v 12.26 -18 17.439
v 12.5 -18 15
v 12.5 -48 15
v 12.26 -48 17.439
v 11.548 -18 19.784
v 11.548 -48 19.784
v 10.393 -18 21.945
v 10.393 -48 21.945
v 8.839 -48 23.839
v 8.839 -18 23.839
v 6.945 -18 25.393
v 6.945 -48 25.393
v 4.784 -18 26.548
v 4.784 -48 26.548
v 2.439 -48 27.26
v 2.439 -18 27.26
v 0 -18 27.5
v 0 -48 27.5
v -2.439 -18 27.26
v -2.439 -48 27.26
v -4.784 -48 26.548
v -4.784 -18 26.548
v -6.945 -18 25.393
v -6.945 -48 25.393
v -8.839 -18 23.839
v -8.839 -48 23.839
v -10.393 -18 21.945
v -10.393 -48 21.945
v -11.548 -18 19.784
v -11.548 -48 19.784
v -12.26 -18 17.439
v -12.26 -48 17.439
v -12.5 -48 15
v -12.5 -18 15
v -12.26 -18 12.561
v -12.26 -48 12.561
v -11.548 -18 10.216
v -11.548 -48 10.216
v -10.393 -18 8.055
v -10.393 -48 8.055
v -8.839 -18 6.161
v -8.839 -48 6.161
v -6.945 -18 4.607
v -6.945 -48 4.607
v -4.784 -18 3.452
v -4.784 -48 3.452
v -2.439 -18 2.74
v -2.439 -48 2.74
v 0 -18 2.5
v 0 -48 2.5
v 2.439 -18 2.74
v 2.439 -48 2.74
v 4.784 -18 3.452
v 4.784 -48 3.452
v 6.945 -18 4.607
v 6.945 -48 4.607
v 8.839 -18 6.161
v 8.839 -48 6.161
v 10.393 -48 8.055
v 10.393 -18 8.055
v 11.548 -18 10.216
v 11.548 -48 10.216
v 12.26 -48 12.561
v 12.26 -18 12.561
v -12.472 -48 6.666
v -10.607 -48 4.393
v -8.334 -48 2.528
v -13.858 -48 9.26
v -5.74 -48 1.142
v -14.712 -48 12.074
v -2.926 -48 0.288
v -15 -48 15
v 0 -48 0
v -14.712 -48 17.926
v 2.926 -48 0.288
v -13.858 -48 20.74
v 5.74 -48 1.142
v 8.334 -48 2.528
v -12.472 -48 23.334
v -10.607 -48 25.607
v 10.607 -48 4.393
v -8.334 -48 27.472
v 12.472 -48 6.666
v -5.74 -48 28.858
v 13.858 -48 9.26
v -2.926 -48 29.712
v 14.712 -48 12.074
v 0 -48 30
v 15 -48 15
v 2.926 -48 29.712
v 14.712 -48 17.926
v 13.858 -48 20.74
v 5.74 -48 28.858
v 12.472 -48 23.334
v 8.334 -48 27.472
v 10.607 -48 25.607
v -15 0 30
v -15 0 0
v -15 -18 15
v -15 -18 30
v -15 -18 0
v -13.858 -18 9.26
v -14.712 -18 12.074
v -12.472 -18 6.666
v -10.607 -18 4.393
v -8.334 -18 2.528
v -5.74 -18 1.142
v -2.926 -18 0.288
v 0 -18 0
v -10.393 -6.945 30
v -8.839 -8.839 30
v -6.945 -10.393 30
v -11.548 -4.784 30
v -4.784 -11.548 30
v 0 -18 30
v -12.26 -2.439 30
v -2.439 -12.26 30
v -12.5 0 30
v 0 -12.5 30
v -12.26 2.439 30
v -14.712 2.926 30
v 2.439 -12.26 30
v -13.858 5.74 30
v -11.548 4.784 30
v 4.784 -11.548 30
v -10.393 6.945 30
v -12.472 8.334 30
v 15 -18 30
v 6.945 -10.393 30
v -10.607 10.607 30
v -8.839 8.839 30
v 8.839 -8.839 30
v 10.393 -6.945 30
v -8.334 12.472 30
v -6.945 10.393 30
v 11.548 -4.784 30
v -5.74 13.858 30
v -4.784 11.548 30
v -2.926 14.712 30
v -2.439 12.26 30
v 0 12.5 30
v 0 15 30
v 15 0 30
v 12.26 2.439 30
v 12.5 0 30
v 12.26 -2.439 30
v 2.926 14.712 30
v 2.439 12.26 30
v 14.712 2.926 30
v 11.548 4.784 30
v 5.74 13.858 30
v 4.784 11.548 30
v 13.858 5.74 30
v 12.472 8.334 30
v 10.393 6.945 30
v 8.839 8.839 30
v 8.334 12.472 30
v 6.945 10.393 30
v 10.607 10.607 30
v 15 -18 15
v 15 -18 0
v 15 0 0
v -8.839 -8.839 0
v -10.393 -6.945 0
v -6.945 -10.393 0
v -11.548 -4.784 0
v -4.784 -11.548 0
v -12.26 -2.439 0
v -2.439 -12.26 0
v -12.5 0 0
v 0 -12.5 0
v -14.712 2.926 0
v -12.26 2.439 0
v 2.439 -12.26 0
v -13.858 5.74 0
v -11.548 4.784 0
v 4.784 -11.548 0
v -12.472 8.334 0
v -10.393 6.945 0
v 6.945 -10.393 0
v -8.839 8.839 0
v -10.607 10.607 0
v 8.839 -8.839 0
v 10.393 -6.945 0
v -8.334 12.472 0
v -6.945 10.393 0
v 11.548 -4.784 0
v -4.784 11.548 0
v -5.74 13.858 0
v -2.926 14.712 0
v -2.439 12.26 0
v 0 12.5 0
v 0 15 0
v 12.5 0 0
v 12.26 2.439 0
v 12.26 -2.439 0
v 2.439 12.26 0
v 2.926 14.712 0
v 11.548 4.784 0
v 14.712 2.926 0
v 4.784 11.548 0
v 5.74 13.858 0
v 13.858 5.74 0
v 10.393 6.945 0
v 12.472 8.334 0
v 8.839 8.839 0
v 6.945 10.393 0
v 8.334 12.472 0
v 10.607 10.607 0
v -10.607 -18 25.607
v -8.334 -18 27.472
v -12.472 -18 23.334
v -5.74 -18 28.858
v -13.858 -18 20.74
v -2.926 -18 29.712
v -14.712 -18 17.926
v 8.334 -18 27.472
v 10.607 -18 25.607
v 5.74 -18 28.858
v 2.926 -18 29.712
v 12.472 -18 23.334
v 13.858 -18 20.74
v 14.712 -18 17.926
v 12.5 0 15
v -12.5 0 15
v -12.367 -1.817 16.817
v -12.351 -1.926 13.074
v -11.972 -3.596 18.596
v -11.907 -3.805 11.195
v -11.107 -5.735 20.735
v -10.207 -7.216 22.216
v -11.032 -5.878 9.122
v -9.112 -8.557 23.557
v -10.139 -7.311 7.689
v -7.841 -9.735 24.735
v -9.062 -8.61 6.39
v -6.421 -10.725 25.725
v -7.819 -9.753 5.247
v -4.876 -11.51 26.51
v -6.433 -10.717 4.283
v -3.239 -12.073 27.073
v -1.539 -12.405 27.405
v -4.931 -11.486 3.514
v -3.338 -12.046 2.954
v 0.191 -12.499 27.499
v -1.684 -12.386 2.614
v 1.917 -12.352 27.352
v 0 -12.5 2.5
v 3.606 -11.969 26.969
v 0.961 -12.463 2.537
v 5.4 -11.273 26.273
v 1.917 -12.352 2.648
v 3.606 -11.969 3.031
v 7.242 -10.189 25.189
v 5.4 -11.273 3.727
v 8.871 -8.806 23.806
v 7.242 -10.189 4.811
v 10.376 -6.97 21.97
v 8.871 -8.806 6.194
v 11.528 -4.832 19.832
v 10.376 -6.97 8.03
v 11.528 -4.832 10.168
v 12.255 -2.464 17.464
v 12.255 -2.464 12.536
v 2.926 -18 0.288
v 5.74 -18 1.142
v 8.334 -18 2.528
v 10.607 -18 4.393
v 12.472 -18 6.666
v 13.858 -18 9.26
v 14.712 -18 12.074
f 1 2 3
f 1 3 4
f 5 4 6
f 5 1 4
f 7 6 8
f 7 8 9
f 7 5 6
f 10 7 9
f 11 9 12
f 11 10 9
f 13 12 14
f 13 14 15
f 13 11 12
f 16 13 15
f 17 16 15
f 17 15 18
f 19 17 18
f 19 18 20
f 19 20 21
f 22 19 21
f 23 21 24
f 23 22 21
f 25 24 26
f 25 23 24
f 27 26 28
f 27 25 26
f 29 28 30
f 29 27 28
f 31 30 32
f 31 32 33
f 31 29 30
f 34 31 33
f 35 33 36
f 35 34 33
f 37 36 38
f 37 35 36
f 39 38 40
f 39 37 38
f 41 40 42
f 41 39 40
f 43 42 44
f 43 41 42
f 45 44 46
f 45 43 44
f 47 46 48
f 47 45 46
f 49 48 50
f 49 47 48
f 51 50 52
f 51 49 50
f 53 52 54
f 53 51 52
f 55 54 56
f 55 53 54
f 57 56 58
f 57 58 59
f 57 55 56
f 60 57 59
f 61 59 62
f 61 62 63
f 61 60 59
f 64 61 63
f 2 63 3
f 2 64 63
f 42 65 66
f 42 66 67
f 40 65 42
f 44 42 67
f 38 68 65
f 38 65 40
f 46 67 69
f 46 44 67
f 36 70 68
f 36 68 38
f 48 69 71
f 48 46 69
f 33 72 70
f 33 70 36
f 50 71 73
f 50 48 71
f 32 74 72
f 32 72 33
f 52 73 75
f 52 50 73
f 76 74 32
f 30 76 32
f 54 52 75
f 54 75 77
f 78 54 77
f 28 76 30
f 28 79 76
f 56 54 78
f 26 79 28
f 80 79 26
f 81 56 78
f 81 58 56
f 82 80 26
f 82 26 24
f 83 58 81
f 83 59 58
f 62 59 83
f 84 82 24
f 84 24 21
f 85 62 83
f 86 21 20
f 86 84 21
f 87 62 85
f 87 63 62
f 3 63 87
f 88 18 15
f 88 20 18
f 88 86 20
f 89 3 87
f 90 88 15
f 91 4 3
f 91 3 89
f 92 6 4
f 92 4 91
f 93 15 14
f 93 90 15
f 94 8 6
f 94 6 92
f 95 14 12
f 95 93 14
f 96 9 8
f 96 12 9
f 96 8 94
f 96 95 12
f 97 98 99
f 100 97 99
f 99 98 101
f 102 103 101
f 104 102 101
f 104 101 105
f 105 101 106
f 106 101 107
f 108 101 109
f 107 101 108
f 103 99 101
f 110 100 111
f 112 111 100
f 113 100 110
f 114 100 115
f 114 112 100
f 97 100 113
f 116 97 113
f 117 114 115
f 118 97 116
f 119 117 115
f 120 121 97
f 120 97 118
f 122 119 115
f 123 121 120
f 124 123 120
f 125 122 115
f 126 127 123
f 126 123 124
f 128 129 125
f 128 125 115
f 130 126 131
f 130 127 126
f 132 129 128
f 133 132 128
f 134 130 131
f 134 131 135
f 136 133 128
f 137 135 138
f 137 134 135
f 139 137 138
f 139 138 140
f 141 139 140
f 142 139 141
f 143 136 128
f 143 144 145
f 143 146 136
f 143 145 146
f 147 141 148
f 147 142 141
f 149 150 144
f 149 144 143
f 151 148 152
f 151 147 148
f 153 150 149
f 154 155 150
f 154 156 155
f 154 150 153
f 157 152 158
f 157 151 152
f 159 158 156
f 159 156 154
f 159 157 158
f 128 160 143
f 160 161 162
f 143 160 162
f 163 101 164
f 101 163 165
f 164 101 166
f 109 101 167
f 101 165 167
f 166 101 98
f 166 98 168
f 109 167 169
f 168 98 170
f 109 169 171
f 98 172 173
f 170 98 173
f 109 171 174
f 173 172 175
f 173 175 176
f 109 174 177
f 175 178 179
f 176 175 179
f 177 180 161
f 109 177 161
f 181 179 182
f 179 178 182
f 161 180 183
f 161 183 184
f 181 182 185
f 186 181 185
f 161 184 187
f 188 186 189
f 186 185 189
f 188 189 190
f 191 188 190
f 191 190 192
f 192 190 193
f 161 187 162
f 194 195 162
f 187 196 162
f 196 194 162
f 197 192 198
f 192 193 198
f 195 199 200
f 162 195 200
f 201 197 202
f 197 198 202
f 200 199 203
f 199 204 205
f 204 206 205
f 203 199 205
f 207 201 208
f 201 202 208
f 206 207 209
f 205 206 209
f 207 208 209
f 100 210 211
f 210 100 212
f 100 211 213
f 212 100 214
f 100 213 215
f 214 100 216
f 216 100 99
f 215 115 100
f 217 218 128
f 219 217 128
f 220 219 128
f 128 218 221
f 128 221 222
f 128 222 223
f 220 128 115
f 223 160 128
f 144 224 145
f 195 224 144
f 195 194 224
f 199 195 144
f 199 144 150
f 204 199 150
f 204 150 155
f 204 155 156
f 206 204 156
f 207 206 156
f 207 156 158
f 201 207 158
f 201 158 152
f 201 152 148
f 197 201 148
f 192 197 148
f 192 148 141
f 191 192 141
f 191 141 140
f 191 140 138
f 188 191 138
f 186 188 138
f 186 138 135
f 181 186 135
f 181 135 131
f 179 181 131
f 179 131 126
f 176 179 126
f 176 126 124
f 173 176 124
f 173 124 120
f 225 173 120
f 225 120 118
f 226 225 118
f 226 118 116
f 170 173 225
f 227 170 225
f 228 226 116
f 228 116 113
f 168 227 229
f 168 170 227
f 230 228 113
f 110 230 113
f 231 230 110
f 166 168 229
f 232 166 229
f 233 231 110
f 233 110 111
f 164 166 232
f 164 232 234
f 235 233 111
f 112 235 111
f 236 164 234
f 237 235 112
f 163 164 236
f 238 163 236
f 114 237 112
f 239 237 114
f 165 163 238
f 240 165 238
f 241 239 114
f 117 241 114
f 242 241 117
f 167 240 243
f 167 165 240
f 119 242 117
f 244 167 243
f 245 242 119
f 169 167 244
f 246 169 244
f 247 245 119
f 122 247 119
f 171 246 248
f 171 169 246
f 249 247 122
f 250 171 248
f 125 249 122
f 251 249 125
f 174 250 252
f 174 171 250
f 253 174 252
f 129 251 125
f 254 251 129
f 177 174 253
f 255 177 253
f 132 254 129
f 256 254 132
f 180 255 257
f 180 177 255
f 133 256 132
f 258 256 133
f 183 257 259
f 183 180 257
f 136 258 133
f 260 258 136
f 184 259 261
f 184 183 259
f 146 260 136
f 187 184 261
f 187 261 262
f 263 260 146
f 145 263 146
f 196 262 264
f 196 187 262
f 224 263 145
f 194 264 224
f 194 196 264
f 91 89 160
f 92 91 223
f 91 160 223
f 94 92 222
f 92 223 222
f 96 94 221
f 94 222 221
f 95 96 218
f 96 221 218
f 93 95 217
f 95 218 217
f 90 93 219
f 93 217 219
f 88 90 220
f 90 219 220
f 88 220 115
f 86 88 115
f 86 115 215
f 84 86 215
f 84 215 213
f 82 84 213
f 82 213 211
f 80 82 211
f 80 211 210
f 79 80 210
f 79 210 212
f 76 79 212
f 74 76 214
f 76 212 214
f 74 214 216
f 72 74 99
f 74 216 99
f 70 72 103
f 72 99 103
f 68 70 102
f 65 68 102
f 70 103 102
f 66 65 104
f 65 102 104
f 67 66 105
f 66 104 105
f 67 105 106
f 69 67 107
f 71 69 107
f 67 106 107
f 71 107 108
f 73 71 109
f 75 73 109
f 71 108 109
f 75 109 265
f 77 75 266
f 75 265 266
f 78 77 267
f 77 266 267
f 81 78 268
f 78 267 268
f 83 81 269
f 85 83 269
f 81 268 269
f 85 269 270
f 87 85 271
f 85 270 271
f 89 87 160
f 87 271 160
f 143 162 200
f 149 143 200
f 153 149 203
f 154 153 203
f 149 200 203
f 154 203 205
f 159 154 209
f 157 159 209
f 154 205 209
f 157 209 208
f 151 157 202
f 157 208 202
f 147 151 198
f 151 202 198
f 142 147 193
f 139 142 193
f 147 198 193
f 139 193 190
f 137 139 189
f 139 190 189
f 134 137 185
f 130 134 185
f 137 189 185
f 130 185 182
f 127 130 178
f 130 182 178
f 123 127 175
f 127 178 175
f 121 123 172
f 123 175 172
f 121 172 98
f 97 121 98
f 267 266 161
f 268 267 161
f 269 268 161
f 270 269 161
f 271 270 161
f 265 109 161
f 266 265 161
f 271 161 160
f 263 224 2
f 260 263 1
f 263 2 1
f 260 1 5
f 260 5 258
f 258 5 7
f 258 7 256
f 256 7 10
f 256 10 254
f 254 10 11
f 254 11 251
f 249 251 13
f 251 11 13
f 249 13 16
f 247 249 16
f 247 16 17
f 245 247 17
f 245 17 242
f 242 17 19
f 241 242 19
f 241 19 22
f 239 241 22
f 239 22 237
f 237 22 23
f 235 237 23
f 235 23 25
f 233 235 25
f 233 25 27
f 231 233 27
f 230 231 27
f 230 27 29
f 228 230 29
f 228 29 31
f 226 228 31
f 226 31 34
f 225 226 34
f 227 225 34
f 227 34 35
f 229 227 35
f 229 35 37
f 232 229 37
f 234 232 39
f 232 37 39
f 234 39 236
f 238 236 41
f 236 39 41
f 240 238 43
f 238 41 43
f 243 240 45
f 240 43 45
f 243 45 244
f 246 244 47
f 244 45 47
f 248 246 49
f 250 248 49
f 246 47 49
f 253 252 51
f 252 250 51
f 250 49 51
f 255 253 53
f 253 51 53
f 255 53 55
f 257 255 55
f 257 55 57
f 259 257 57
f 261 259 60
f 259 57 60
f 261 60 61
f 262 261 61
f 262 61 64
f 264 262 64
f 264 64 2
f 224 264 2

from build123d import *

# Parameters (mm, degrees)
SKETCH1_R           = 15
SKETCH1_R_2         = 12.5
BOSS_EXTRUDE2_DEPTH = 30
SKETCH3_R           = 15
SKETCH3_R_2         = 12.5
BOSS_EXTRUDE3_DEPTH = 30
SKETCH4_R           = 12.5
CUT_EXTRUDE1_DEPTH  = 18


with BuildPart() as part:
    # Sketch1 → Boss-Extrude2 (new body)
    with BuildSketch(Plane.XY):
        with BuildLine():
            ThreePointArc((15, 0), (0, -15), (-15, 0))
            Line((-15, 0), (-15, -15))
            Line((-15, -15), (-15, -18))
            Line((-15, -18), (15, -18))
            Line((15, -18), (15, 0))
        make_face()
        Circle(SKETCH1_R)
        Circle(SKETCH1_R_2, mode=Mode.SUBTRACT)
    extrude(amount=BOSS_EXTRUDE2_DEPTH)

    # Sketch3 → Boss-Extrude3 (add)
    with BuildSketch(Plane.XZ.offset(18)):
        with Locations((0, 15)):
            Circle(SKETCH3_R)
        with Locations((0, 15)):
            Circle(SKETCH3_R_2, mode=Mode.SUBTRACT)
    extrude(amount=BOSS_EXTRUDE3_DEPTH)

    # Sketch4 → Cut-Extrude1 (cut)
    with BuildSketch(Plane.XZ.offset(18)):
        with Locations((0, 15)):
            Circle(SKETCH4_R)
    extrude(amount=-CUT_EXTRUDE1_DEPTH, mode=Mode.SUBTRACT)


solid = part.part
